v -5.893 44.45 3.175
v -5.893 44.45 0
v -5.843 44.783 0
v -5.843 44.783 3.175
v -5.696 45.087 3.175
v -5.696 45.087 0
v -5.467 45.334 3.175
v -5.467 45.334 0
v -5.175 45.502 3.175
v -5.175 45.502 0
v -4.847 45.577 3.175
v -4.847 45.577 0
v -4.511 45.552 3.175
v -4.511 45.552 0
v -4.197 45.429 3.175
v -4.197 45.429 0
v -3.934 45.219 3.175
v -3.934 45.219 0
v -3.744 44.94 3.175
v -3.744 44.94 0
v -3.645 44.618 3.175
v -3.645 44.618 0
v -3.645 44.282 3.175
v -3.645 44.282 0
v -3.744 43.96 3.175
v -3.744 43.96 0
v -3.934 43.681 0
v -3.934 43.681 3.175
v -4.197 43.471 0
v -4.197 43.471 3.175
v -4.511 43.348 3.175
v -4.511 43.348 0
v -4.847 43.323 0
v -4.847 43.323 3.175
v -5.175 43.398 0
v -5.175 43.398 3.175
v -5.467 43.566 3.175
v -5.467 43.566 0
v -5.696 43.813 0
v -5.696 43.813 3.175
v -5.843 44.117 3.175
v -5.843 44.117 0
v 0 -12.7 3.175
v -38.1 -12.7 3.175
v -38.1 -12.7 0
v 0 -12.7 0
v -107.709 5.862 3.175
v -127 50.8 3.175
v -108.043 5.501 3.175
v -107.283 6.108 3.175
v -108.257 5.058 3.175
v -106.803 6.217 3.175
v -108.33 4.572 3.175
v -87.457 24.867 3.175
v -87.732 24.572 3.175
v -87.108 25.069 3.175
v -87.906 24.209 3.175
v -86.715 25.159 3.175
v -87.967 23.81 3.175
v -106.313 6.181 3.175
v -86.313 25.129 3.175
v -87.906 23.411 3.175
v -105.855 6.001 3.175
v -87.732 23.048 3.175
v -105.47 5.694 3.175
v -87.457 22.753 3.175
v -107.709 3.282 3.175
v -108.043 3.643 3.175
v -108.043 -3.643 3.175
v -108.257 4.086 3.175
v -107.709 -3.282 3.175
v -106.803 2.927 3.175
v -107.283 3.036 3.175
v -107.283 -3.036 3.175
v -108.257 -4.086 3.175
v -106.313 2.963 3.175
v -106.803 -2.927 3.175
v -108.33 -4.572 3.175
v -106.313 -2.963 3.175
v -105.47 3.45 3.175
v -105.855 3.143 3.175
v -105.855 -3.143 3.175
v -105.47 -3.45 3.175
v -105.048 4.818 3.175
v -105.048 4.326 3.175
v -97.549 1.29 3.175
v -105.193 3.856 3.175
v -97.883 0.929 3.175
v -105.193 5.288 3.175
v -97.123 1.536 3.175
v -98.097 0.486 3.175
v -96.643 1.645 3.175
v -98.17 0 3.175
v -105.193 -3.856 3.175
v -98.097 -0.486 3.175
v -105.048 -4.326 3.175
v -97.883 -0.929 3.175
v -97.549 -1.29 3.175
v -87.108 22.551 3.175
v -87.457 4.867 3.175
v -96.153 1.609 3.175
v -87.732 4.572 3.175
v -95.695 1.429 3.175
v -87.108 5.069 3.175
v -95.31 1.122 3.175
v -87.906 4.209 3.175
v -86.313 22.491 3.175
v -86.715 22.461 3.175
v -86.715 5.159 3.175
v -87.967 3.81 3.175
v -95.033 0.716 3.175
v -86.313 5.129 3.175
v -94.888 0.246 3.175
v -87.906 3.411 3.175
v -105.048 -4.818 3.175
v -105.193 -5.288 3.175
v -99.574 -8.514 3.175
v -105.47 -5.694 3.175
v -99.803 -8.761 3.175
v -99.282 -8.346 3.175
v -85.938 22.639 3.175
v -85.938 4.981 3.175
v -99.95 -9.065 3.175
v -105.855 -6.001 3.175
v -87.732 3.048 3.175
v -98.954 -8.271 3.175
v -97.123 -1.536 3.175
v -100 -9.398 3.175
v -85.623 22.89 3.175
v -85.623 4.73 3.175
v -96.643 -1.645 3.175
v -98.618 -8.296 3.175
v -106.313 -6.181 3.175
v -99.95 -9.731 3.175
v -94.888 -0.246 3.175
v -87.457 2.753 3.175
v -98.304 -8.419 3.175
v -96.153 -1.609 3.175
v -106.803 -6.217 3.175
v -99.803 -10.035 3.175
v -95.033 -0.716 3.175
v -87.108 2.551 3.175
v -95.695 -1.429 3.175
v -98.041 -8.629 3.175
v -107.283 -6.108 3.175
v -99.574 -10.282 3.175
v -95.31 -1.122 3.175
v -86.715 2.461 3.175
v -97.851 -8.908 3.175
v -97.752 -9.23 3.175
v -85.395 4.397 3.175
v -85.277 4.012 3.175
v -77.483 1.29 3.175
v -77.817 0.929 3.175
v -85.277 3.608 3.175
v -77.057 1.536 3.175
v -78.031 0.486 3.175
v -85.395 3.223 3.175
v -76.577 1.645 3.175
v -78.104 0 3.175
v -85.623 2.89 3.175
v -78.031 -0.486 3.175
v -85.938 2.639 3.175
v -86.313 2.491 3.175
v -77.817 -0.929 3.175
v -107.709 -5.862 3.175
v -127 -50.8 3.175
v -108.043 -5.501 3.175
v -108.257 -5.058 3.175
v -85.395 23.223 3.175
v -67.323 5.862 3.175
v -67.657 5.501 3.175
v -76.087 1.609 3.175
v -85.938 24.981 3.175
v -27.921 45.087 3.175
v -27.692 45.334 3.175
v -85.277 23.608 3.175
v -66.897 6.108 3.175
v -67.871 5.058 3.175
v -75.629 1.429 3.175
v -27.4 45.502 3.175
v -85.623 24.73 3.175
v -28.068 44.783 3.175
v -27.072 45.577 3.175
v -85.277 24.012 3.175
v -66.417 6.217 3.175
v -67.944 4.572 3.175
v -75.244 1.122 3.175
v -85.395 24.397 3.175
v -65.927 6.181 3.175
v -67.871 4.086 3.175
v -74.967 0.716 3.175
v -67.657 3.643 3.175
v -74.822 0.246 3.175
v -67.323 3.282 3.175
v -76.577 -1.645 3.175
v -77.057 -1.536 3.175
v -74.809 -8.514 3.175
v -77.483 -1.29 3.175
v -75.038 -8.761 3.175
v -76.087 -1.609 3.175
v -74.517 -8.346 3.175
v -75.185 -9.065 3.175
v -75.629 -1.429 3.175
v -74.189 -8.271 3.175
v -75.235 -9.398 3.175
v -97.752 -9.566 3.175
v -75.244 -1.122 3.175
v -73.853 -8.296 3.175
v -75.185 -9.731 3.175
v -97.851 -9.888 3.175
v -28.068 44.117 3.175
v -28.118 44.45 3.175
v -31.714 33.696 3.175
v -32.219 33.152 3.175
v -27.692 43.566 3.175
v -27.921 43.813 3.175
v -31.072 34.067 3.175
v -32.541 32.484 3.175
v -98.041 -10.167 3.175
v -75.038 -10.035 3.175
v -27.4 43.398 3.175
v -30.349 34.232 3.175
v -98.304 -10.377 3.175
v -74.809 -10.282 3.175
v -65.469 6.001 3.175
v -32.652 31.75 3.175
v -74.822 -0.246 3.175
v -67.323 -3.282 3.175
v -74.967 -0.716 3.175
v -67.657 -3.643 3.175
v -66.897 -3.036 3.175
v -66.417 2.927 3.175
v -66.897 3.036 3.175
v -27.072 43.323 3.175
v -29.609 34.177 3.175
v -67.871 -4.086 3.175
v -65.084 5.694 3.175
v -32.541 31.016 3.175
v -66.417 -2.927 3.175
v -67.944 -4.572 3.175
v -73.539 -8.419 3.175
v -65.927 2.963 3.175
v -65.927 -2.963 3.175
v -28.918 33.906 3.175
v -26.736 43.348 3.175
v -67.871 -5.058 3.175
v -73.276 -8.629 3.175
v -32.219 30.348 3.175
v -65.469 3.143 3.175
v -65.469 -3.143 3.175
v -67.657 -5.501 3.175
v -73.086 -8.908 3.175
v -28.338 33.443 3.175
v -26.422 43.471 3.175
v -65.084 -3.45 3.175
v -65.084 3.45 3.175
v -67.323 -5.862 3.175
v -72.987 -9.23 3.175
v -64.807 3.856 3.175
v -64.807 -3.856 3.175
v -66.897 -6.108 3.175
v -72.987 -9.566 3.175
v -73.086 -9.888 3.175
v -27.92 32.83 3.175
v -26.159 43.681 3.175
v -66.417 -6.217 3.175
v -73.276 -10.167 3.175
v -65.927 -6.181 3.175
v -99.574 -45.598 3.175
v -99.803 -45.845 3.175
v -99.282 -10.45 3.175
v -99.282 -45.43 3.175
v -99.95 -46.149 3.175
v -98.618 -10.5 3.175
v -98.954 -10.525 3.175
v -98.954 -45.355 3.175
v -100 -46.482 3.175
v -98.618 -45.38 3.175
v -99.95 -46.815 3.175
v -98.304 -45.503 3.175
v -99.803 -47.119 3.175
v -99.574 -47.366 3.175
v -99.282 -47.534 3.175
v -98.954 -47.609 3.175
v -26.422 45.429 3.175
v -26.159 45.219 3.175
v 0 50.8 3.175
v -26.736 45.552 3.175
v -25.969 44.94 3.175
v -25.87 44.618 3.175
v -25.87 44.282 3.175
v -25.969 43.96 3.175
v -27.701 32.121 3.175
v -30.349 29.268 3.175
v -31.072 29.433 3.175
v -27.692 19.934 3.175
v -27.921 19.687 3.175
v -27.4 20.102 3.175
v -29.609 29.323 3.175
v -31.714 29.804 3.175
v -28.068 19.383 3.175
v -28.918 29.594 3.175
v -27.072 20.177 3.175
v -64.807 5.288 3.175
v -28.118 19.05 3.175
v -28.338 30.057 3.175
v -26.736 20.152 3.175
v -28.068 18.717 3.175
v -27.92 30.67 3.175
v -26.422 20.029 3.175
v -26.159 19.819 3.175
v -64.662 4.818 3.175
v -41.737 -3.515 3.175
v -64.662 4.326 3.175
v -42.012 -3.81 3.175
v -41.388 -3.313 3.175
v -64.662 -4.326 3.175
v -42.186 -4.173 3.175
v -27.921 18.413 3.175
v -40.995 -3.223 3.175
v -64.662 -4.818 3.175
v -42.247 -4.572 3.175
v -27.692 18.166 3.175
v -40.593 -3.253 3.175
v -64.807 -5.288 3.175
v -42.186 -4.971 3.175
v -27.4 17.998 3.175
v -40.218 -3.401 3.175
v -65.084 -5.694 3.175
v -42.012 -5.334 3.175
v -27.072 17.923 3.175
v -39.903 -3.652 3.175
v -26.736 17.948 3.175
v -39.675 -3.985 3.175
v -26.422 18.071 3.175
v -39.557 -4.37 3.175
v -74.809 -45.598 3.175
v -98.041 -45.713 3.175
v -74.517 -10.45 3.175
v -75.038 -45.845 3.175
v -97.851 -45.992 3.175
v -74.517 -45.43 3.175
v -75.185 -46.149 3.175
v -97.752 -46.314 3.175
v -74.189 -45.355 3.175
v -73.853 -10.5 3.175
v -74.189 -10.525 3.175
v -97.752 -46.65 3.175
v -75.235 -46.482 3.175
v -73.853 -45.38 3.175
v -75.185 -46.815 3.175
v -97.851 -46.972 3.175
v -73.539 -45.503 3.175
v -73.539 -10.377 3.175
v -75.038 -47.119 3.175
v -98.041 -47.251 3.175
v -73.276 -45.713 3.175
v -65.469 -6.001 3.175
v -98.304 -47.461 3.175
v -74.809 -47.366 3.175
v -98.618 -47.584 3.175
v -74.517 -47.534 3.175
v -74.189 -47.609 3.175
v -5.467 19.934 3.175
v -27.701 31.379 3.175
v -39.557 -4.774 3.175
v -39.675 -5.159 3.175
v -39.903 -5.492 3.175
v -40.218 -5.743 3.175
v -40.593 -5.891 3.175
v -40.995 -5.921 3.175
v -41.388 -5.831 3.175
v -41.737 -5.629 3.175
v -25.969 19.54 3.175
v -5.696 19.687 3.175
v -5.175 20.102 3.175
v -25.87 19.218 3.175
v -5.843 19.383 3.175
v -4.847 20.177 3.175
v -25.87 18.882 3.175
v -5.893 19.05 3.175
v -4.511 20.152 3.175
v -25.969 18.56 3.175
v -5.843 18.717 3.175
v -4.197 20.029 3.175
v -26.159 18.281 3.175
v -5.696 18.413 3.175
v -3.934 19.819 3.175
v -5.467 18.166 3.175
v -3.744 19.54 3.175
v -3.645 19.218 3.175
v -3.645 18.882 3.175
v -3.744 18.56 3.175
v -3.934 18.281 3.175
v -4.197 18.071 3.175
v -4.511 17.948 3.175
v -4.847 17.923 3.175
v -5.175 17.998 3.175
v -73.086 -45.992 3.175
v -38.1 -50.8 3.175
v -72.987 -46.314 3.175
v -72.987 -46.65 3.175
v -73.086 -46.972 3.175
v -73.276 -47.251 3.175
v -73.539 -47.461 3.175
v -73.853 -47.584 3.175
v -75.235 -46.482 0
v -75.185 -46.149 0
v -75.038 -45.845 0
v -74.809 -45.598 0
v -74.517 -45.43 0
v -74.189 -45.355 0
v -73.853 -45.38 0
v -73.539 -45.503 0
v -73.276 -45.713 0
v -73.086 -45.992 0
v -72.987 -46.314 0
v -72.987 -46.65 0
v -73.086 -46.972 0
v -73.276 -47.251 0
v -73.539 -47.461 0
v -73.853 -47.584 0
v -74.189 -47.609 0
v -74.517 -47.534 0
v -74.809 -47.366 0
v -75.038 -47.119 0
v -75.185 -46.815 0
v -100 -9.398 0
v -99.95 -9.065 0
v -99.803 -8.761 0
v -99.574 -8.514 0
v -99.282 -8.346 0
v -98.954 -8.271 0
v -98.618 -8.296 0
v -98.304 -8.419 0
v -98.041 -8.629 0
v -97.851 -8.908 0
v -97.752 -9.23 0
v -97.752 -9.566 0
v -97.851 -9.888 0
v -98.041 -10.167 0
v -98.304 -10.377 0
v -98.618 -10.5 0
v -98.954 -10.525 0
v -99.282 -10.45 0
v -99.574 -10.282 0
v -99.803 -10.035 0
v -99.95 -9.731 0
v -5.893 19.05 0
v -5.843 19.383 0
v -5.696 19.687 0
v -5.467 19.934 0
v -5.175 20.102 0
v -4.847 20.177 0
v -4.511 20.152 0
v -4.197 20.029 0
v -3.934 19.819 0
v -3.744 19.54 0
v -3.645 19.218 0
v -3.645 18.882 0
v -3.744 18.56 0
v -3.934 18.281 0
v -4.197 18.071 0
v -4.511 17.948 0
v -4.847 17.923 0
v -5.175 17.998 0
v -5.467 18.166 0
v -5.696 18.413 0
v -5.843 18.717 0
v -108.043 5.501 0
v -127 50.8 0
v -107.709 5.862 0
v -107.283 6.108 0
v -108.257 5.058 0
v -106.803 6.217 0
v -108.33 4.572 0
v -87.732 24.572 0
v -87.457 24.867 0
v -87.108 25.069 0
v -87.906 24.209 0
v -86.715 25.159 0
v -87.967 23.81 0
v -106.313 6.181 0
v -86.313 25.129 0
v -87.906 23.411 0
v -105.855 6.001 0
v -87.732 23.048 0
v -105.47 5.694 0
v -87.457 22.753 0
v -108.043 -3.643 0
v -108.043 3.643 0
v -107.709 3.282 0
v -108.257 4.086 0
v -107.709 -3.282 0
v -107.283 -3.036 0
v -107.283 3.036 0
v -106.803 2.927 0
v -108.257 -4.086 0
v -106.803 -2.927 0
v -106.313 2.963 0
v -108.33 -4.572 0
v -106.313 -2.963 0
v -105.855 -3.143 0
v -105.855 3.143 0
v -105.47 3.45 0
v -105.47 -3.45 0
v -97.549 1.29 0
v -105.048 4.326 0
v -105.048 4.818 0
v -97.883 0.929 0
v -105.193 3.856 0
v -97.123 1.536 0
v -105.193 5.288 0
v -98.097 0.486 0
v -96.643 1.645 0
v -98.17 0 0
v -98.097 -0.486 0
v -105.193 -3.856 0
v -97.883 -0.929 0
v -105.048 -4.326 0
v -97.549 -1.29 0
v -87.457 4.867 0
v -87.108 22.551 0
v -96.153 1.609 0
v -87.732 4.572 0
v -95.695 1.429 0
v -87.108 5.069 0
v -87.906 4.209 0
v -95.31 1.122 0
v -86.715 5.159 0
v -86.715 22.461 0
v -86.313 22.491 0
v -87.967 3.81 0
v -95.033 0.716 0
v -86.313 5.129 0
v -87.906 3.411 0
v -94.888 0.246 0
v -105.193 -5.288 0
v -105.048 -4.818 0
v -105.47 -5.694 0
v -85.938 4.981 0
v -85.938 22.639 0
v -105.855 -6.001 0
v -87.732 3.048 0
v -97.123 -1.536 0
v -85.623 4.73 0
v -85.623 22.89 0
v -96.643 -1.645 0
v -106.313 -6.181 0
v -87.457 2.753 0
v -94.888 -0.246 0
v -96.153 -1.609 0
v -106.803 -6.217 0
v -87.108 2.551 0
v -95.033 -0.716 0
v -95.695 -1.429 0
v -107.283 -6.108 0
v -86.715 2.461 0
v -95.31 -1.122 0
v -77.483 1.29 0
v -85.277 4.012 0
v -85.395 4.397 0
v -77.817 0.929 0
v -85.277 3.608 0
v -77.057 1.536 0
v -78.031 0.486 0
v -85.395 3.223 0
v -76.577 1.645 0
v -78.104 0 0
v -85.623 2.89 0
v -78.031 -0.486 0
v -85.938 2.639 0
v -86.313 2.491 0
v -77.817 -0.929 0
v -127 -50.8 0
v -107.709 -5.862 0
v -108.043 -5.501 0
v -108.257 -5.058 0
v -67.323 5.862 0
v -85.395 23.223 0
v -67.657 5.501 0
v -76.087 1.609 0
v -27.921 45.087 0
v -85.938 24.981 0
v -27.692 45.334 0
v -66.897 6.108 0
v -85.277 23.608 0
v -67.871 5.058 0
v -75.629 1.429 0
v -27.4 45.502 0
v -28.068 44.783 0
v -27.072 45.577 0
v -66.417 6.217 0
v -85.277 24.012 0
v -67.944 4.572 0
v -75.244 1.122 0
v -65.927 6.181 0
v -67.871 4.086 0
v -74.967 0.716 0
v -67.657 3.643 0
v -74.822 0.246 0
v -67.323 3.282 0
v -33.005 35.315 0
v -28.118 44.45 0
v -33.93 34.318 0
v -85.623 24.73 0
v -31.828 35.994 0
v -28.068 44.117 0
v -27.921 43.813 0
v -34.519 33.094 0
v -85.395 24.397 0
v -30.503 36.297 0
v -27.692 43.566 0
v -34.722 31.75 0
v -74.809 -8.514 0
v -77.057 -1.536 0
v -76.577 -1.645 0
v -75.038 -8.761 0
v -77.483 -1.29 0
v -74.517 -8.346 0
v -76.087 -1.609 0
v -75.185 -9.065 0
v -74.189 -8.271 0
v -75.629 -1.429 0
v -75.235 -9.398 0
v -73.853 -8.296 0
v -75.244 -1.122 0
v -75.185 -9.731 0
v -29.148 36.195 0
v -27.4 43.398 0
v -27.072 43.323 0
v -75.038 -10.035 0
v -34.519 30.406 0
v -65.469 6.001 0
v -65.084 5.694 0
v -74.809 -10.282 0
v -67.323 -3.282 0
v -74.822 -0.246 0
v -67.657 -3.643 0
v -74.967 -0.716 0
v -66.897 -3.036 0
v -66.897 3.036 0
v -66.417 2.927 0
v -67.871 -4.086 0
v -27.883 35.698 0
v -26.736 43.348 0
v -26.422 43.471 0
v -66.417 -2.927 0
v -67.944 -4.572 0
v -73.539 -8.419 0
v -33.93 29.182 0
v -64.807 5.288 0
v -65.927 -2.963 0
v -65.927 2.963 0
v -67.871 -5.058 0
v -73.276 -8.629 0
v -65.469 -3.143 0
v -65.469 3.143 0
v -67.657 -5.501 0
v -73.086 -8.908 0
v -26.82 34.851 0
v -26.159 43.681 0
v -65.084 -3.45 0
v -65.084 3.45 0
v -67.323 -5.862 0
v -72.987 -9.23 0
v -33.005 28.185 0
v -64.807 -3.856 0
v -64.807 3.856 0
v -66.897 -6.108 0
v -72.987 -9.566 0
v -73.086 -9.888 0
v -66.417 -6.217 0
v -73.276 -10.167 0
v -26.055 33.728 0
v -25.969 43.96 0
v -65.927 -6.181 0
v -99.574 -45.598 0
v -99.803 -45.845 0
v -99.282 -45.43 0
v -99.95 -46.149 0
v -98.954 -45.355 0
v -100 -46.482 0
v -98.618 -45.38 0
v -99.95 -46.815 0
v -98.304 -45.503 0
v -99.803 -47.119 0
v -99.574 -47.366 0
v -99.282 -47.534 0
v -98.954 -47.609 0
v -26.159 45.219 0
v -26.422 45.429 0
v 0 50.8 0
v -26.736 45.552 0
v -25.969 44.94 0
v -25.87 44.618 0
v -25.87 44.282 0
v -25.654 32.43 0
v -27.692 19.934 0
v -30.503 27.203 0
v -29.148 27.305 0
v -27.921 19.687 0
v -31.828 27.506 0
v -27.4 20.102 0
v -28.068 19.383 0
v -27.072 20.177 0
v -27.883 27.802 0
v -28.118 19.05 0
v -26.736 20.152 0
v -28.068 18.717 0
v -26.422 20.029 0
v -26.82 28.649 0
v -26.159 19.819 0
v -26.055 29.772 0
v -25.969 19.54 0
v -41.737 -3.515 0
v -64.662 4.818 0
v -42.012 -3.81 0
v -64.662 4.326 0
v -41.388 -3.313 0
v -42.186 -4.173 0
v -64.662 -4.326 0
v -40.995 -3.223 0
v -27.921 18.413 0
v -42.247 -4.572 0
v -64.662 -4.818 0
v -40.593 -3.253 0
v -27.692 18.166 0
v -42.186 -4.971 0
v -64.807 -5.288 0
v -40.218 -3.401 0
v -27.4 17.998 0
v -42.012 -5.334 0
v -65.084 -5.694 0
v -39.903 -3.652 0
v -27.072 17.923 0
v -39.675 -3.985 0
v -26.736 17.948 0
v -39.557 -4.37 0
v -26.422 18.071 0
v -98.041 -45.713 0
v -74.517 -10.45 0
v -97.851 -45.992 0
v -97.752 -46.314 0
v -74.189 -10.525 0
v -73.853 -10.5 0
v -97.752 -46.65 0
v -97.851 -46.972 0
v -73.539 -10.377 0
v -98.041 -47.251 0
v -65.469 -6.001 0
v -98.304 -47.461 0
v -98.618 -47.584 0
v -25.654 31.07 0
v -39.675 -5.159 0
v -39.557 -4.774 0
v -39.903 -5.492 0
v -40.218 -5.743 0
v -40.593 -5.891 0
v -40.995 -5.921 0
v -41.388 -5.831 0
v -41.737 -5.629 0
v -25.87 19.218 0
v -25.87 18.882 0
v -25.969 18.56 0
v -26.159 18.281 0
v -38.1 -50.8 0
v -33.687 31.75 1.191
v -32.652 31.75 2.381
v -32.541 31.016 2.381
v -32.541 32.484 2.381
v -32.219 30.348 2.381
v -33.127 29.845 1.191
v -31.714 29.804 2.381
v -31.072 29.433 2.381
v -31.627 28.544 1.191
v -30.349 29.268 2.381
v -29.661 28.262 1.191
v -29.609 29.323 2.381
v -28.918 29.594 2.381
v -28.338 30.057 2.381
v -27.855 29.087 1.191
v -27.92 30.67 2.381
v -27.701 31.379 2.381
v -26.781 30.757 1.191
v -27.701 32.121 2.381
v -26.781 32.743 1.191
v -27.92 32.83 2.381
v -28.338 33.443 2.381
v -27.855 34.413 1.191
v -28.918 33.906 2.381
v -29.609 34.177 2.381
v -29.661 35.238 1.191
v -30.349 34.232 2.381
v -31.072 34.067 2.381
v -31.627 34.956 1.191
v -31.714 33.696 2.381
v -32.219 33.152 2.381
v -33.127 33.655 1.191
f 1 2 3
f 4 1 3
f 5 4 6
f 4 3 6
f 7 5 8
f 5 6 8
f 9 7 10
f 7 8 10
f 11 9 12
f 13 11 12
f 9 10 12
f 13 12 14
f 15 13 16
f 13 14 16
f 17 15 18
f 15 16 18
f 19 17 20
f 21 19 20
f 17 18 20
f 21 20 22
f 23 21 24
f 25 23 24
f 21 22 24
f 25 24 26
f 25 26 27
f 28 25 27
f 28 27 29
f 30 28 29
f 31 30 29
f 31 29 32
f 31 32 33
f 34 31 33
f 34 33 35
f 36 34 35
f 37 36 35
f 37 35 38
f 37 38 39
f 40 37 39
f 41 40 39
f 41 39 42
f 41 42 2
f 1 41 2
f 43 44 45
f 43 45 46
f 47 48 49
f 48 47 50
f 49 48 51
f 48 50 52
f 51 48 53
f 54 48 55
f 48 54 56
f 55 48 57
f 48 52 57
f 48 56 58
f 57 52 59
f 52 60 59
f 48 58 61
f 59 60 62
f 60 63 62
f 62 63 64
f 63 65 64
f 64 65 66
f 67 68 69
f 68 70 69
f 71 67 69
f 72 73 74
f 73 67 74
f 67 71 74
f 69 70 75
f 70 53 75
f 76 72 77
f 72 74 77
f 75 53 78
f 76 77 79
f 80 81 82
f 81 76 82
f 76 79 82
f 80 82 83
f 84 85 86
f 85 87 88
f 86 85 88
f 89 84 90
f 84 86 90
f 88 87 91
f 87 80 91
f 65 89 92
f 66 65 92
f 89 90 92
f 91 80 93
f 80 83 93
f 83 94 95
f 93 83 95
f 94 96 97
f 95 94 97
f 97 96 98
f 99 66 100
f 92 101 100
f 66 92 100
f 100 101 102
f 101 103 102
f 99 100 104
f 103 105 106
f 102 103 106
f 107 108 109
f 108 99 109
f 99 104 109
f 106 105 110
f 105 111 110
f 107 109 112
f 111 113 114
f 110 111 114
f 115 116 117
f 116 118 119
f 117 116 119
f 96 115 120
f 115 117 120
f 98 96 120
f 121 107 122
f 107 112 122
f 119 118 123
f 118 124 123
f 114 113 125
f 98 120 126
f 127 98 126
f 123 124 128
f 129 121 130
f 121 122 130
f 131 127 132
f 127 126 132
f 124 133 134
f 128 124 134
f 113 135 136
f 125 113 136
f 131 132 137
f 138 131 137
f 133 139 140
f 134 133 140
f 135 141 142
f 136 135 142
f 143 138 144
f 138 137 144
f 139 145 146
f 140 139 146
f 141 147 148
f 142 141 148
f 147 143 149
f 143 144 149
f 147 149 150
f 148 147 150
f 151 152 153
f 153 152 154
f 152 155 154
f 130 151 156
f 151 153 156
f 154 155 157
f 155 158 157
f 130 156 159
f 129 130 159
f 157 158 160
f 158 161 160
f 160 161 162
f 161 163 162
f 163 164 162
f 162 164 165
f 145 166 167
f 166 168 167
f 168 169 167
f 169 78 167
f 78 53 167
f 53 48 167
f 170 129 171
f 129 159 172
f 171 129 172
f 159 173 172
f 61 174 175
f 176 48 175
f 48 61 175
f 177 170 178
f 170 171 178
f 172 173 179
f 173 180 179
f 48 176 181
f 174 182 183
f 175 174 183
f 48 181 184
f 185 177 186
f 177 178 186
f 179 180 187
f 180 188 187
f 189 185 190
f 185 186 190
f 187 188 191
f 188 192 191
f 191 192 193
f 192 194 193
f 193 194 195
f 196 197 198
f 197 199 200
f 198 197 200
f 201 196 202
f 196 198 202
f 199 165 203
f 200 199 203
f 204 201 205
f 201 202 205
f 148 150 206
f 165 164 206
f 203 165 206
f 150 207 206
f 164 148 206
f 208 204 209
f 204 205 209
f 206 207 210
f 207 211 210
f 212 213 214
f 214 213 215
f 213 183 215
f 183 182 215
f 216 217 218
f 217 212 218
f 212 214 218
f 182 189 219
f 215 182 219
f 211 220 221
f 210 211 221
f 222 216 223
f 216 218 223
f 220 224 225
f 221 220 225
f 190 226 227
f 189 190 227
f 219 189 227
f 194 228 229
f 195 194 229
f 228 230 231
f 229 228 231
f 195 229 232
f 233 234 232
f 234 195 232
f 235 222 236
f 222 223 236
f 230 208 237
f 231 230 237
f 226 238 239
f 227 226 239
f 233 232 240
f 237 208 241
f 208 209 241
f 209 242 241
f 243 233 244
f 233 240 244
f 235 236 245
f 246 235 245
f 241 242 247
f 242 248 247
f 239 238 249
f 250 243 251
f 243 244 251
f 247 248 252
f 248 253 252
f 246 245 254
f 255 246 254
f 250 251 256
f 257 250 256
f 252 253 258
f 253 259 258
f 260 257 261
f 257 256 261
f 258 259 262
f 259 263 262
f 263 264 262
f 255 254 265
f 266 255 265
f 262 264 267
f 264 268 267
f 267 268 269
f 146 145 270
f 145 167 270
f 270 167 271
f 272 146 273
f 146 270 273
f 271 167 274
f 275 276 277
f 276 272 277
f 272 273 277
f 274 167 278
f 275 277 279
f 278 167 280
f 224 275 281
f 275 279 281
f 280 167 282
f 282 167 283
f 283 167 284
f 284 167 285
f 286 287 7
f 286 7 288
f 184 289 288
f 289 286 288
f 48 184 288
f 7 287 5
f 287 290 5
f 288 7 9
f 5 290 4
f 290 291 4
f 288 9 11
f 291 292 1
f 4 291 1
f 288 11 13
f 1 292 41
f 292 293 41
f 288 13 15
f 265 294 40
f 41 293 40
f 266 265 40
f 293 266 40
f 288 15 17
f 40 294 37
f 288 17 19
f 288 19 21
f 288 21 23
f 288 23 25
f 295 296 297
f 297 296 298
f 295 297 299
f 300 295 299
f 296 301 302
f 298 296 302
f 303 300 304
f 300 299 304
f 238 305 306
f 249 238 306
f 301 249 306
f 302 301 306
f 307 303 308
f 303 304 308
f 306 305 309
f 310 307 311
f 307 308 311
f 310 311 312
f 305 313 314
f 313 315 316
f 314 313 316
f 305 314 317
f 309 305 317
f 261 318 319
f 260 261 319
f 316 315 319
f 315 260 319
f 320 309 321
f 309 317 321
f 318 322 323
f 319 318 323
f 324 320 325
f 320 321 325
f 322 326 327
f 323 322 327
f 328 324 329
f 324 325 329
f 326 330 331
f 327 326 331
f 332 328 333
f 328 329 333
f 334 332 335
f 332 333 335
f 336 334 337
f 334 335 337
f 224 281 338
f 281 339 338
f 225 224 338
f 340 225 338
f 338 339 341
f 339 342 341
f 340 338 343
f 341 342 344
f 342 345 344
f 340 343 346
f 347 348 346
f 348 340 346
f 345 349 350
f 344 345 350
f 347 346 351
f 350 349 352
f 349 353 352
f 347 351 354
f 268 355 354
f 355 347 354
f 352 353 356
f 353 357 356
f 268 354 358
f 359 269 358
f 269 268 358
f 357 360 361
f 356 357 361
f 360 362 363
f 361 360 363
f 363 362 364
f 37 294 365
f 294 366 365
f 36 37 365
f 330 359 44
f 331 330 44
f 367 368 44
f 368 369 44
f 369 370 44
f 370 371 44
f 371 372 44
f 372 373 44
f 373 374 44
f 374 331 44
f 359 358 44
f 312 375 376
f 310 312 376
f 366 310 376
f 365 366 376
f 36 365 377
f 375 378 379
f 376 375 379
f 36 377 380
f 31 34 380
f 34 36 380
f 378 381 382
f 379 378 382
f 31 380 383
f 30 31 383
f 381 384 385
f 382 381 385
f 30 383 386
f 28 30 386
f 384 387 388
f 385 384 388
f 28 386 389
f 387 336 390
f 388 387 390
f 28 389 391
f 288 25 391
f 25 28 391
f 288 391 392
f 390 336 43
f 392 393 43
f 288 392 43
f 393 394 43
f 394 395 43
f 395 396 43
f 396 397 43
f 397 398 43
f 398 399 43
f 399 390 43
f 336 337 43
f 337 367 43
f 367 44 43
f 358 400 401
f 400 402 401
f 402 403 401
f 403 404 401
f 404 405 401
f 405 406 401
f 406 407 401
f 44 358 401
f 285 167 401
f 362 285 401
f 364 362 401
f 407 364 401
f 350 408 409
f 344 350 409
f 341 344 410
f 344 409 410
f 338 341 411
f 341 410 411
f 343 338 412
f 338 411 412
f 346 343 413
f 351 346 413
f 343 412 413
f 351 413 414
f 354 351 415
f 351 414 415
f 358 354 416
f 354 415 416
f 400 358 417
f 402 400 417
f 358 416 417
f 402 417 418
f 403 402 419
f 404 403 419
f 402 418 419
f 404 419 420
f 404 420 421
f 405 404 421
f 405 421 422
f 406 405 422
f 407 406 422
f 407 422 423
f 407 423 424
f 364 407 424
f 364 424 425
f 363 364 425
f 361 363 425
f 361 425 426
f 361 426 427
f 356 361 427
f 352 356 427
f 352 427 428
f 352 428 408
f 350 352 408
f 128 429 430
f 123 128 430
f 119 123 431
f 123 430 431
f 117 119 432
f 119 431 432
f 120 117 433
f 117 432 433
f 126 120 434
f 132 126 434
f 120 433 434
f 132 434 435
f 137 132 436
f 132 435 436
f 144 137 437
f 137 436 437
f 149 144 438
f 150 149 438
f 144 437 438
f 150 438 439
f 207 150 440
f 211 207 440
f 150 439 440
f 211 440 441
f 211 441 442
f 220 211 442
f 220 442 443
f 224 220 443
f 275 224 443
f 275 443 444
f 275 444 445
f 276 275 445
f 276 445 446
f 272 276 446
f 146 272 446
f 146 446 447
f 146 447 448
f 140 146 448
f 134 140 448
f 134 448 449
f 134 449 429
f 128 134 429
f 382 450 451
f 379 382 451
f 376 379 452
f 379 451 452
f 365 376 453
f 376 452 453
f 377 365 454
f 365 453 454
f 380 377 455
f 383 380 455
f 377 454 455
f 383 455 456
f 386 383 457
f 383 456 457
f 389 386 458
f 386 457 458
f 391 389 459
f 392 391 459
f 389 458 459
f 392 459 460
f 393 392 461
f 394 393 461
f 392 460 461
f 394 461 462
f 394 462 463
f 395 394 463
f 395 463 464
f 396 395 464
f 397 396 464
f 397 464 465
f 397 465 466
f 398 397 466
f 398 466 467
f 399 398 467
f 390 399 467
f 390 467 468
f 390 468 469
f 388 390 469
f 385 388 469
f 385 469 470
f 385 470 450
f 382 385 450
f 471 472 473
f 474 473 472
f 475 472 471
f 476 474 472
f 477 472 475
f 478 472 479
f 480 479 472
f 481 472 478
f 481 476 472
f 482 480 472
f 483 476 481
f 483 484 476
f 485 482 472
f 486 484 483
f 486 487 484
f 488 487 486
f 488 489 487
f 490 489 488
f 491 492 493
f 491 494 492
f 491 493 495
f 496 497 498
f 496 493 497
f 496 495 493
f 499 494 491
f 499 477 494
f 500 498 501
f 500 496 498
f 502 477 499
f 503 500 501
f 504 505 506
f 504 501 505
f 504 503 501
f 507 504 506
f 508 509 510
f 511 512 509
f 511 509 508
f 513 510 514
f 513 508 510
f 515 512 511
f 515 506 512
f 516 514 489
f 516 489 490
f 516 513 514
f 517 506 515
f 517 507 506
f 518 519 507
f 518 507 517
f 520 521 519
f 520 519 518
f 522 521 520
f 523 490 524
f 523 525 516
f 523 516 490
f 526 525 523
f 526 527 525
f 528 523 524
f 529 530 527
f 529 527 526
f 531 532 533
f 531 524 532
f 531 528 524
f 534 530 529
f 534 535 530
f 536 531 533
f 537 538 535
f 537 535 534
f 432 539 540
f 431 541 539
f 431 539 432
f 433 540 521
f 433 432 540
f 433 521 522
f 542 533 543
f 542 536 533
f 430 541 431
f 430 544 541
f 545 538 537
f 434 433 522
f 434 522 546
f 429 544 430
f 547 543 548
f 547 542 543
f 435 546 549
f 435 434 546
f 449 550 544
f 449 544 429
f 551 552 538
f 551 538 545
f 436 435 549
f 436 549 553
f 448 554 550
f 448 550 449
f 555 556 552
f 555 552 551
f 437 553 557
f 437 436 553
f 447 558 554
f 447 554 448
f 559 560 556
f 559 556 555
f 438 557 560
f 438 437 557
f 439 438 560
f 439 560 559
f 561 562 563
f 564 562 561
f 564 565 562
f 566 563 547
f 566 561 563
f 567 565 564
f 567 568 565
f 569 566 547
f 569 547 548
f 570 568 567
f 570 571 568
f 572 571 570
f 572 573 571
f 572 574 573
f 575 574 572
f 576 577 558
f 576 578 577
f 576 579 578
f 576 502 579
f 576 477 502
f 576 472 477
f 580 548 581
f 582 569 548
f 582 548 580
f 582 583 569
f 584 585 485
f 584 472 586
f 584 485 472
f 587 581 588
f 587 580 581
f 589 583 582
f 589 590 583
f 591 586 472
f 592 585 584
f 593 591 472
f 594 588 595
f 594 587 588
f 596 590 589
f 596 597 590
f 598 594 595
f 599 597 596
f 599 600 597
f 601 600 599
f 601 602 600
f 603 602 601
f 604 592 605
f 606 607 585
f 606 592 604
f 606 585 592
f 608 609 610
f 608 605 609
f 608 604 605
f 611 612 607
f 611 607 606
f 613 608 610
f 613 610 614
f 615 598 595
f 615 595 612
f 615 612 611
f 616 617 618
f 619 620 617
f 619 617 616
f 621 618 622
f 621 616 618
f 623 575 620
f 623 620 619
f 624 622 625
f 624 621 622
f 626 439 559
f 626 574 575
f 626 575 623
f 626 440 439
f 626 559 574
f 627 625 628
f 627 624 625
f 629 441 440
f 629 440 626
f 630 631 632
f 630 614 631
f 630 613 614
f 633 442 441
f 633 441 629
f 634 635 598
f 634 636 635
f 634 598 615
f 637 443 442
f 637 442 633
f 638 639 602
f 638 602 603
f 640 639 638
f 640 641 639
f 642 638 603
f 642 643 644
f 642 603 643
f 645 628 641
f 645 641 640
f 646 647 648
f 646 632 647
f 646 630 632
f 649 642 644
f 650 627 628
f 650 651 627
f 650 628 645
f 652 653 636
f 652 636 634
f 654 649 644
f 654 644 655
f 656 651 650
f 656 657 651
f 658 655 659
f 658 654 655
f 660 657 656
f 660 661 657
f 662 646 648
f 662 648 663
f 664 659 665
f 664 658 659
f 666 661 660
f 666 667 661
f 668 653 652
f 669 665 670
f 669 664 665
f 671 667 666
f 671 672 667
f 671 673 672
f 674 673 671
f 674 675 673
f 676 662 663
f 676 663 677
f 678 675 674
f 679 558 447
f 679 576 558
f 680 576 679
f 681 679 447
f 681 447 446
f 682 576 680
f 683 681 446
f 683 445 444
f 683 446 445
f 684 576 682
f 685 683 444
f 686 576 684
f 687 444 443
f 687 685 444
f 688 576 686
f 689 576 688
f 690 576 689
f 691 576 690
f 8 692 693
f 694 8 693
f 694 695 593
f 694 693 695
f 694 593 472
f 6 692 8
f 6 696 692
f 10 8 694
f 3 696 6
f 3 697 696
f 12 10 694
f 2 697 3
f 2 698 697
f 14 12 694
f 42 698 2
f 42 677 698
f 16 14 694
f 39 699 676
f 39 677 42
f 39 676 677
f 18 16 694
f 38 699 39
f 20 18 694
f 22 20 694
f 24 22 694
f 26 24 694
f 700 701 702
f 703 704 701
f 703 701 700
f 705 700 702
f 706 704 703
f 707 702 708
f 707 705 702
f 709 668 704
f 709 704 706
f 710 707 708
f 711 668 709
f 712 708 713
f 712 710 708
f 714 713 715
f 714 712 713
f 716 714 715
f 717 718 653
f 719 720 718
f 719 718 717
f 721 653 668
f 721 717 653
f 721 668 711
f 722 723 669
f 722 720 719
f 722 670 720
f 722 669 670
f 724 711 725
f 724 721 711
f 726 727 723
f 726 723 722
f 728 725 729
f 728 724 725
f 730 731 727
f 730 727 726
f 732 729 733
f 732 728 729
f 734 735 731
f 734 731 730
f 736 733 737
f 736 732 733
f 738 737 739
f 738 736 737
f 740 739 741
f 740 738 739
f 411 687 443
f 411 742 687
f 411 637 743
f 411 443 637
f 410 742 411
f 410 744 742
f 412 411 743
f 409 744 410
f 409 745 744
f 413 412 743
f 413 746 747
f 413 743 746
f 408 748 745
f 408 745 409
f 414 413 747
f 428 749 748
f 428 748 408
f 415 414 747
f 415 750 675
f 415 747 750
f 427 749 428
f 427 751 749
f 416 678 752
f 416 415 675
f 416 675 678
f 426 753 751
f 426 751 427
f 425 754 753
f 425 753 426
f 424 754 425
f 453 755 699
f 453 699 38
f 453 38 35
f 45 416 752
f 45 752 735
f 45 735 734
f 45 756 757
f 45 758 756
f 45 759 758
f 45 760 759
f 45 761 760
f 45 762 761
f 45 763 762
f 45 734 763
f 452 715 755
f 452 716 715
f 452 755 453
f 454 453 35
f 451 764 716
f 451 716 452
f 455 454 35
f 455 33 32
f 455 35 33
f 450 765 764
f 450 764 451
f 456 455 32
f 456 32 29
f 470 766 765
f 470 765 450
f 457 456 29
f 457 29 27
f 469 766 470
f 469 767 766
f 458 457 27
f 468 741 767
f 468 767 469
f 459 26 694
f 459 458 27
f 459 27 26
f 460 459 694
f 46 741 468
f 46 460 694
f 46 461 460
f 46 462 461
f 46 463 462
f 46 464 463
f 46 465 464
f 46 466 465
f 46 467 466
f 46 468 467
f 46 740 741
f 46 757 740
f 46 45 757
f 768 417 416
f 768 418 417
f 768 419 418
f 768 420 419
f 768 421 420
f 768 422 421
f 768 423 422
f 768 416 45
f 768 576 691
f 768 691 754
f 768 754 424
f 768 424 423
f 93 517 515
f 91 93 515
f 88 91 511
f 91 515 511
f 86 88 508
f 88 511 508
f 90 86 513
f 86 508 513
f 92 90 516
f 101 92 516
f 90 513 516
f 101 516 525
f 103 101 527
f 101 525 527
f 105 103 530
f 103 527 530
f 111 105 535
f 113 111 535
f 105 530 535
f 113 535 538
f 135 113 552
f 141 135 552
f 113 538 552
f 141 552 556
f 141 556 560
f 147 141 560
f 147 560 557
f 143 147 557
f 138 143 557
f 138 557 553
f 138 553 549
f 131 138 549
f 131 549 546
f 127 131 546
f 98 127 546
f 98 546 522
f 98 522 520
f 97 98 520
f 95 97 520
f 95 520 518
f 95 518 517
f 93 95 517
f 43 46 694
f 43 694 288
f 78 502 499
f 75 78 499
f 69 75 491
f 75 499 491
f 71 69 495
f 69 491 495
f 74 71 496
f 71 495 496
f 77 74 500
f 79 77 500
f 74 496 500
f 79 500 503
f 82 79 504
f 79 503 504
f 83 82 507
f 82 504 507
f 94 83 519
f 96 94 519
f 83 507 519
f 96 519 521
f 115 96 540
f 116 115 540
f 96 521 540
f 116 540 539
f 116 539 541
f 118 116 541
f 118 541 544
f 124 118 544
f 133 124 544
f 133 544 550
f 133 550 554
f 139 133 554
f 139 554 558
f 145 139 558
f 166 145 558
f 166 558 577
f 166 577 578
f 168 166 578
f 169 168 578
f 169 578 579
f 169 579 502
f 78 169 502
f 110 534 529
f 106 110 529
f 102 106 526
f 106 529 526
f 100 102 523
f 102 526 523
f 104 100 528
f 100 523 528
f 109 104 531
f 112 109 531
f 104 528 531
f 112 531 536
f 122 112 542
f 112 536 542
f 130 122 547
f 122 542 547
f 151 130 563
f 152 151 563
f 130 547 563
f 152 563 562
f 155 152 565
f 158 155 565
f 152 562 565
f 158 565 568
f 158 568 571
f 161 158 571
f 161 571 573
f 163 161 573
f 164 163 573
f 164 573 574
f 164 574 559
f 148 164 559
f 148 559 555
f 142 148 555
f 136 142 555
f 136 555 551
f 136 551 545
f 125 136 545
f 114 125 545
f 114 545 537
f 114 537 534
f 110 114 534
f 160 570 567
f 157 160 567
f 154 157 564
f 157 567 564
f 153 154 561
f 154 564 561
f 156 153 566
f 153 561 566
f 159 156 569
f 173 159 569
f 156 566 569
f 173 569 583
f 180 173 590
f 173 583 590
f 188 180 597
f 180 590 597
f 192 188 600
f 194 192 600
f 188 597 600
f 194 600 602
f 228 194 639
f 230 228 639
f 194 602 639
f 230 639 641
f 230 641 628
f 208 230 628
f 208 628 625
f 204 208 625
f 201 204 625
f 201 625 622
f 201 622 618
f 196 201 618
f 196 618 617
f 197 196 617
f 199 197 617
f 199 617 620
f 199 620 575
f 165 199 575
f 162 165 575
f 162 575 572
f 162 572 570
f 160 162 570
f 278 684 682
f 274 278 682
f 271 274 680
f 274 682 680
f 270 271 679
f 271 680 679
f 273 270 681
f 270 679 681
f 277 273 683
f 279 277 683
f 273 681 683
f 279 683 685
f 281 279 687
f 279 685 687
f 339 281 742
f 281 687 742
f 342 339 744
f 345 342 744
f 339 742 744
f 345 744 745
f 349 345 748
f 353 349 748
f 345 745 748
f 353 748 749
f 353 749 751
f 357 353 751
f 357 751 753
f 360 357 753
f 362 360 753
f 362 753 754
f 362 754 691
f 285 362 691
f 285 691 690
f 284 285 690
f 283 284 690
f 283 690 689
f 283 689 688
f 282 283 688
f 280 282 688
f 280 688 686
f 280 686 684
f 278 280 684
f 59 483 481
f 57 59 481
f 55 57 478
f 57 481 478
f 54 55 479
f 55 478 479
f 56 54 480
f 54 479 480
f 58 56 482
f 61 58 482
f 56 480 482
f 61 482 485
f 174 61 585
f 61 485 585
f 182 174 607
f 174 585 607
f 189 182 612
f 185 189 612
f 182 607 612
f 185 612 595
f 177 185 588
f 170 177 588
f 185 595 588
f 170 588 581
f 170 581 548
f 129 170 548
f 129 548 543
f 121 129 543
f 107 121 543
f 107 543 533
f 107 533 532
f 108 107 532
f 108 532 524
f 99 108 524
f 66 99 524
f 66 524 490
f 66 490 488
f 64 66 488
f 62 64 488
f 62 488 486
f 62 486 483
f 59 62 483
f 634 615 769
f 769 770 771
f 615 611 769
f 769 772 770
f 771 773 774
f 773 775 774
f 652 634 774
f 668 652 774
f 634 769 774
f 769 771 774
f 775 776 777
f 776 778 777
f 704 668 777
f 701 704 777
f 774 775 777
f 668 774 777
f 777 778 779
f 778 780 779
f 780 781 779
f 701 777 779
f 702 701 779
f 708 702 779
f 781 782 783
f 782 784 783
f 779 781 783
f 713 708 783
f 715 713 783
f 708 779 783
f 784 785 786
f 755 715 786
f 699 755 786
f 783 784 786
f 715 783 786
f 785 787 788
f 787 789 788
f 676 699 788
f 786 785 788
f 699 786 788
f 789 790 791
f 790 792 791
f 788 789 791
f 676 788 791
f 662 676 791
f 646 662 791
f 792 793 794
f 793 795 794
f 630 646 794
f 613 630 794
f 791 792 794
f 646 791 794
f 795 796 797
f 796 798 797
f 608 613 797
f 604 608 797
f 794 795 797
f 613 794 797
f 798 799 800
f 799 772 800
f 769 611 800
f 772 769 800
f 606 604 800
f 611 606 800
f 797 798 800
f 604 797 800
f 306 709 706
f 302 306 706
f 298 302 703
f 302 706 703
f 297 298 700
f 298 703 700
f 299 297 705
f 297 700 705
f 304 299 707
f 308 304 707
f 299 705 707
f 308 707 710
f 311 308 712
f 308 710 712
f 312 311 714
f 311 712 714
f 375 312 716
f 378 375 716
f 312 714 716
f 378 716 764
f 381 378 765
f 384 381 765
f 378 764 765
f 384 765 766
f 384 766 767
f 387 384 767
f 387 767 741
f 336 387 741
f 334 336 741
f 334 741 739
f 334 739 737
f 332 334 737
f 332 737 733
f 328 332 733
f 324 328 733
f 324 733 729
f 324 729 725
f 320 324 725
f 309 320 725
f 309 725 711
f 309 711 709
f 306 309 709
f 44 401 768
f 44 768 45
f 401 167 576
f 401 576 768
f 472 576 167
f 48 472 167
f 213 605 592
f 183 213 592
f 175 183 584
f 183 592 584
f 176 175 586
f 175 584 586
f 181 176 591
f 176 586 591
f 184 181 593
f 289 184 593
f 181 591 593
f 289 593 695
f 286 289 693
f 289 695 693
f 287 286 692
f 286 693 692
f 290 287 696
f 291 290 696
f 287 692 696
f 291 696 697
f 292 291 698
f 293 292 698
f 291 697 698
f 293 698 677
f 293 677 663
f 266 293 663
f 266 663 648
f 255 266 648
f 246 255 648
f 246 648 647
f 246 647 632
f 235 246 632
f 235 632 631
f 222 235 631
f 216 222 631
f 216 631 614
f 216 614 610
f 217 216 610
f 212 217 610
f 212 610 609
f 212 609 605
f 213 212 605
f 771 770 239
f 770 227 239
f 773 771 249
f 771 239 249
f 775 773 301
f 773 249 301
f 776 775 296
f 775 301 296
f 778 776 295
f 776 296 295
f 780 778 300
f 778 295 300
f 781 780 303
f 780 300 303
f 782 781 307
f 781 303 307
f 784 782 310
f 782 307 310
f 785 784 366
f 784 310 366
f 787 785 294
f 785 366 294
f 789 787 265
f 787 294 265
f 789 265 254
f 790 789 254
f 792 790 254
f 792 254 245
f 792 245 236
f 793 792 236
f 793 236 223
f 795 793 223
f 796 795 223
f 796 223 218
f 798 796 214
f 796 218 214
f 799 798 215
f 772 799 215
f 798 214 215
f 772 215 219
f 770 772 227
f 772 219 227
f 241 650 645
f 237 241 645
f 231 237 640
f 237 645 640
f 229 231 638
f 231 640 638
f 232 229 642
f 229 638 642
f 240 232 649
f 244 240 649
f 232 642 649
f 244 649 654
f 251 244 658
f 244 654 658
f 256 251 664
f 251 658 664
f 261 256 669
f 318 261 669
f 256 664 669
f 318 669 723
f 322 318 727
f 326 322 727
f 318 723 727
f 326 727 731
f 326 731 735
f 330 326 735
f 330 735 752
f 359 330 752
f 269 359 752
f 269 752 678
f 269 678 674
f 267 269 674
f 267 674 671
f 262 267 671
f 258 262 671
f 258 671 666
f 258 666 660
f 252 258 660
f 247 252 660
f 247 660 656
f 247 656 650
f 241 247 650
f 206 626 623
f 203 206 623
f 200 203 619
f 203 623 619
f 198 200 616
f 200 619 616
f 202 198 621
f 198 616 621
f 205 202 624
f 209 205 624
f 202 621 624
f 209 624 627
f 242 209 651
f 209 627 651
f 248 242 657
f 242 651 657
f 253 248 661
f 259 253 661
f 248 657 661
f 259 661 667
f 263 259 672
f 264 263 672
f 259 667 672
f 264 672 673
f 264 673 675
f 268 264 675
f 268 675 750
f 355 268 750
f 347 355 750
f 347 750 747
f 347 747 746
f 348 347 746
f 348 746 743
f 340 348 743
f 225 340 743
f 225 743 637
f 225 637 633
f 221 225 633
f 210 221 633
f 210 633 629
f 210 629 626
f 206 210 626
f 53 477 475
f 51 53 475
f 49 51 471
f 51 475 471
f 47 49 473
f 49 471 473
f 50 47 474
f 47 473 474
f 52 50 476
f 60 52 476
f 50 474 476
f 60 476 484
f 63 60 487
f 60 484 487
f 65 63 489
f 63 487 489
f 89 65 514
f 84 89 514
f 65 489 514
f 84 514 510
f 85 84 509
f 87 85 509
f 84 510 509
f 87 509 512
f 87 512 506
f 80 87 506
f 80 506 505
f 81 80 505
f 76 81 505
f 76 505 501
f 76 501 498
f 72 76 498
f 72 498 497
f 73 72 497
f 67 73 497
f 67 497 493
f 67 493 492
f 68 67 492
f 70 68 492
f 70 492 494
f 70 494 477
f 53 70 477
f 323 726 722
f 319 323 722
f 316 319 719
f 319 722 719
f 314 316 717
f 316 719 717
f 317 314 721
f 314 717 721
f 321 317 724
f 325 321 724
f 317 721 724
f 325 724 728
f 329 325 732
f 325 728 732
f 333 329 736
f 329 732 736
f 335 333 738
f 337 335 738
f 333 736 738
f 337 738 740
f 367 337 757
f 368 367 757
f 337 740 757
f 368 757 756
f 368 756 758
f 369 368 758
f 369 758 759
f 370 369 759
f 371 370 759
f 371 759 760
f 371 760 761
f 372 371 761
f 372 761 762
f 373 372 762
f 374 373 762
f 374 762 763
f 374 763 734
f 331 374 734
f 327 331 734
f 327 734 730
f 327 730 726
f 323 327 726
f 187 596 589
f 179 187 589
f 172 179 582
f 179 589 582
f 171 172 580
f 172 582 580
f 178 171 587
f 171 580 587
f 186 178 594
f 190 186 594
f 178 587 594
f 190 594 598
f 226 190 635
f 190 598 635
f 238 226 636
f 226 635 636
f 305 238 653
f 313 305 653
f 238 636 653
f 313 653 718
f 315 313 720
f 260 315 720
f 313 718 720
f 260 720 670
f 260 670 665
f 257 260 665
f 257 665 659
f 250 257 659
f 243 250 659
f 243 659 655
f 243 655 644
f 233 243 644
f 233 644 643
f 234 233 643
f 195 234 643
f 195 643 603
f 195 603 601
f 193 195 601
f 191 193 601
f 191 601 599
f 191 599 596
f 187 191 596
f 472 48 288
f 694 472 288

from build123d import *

# Parameters (mm, degrees)
F0_W            = 127
F0_H            = 3.175
F1_DEPTH        = 50.8
F3_D            = 3.3
F4_W            = 38.1
F4_H            = 38.1
F5_DEPTH        = 3.176
F7_D            = 2.2606
F10_D           = 2.2606
F12_D           = 2.7051
F14_D           = 4.9784
F14_CSINK_D     = 9.1186
F14_CSINK_ANGLE = 82


with BuildPart() as f1:
    # F0 (on Front) → F1 (new body, symmetric)
    with BuildSketch(Plane.XZ):
        with Locations((-63.5, 1.5875)):
            Rectangle(F0_W, F0_H)
    extrude(amount=F1_DEPTH, both=True)

    # F3 (through all)
    with Locations(Plane.XY.offset(3.175)):
        with Locations((-66.294, 4.572), (-66.294, -4.572), (-76.454, 0), (-96.52, 0), (-106.68, 4.572), (-106.68, -4.572)):
            Hole(F3_D / 2)

    # F4 (on face) → F5 (cut, through all)
    with BuildSketch(Plane.XY.offset(3.175)):
        with Locations((-19.05, -31.75)):
            Rectangle(F4_W, F4_H)
    extrude(amount=-F5_DEPTH, mode=Mode.SUBTRACT)

    # F7 (through all)
    with Locations(Plane.XY.offset(3.175)):
        with Locations((-4.7625, 19.05), (-26.9875, 19.05), (-26.9875, 44.45), (-4.7625, 44.45)):
            Hole(F7_D / 2)

    # F10 (through all)
    with Locations(Plane.XY.offset(3.175)):
        with Locations((-74.1045, -46.482), (-98.8695, -46.482), (-98.8695, -9.398), (-74.1045, -9.398)):
            Hole(F10_D / 2)

    # F12 (through all)
    with Locations(Plane.XY.offset(3.175)):
        with Locations((-40.894, -4.572), (-86.614, 3.81), (-86.614, 23.81)):
            Hole(F12_D / 2)

    # F14 (through all)
    with Locations(Plane(origin=(0, 0, 0), x_dir=(1, 0, 0), z_dir=(0, 0, -1))):
        with Locations((-30.1625, -31.75)):
            CounterSinkHole(F14_D / 2, F14_CSINK_D / 2, counter_sink_angle=F14_CSINK_ANGLE)


solid = f1.part
